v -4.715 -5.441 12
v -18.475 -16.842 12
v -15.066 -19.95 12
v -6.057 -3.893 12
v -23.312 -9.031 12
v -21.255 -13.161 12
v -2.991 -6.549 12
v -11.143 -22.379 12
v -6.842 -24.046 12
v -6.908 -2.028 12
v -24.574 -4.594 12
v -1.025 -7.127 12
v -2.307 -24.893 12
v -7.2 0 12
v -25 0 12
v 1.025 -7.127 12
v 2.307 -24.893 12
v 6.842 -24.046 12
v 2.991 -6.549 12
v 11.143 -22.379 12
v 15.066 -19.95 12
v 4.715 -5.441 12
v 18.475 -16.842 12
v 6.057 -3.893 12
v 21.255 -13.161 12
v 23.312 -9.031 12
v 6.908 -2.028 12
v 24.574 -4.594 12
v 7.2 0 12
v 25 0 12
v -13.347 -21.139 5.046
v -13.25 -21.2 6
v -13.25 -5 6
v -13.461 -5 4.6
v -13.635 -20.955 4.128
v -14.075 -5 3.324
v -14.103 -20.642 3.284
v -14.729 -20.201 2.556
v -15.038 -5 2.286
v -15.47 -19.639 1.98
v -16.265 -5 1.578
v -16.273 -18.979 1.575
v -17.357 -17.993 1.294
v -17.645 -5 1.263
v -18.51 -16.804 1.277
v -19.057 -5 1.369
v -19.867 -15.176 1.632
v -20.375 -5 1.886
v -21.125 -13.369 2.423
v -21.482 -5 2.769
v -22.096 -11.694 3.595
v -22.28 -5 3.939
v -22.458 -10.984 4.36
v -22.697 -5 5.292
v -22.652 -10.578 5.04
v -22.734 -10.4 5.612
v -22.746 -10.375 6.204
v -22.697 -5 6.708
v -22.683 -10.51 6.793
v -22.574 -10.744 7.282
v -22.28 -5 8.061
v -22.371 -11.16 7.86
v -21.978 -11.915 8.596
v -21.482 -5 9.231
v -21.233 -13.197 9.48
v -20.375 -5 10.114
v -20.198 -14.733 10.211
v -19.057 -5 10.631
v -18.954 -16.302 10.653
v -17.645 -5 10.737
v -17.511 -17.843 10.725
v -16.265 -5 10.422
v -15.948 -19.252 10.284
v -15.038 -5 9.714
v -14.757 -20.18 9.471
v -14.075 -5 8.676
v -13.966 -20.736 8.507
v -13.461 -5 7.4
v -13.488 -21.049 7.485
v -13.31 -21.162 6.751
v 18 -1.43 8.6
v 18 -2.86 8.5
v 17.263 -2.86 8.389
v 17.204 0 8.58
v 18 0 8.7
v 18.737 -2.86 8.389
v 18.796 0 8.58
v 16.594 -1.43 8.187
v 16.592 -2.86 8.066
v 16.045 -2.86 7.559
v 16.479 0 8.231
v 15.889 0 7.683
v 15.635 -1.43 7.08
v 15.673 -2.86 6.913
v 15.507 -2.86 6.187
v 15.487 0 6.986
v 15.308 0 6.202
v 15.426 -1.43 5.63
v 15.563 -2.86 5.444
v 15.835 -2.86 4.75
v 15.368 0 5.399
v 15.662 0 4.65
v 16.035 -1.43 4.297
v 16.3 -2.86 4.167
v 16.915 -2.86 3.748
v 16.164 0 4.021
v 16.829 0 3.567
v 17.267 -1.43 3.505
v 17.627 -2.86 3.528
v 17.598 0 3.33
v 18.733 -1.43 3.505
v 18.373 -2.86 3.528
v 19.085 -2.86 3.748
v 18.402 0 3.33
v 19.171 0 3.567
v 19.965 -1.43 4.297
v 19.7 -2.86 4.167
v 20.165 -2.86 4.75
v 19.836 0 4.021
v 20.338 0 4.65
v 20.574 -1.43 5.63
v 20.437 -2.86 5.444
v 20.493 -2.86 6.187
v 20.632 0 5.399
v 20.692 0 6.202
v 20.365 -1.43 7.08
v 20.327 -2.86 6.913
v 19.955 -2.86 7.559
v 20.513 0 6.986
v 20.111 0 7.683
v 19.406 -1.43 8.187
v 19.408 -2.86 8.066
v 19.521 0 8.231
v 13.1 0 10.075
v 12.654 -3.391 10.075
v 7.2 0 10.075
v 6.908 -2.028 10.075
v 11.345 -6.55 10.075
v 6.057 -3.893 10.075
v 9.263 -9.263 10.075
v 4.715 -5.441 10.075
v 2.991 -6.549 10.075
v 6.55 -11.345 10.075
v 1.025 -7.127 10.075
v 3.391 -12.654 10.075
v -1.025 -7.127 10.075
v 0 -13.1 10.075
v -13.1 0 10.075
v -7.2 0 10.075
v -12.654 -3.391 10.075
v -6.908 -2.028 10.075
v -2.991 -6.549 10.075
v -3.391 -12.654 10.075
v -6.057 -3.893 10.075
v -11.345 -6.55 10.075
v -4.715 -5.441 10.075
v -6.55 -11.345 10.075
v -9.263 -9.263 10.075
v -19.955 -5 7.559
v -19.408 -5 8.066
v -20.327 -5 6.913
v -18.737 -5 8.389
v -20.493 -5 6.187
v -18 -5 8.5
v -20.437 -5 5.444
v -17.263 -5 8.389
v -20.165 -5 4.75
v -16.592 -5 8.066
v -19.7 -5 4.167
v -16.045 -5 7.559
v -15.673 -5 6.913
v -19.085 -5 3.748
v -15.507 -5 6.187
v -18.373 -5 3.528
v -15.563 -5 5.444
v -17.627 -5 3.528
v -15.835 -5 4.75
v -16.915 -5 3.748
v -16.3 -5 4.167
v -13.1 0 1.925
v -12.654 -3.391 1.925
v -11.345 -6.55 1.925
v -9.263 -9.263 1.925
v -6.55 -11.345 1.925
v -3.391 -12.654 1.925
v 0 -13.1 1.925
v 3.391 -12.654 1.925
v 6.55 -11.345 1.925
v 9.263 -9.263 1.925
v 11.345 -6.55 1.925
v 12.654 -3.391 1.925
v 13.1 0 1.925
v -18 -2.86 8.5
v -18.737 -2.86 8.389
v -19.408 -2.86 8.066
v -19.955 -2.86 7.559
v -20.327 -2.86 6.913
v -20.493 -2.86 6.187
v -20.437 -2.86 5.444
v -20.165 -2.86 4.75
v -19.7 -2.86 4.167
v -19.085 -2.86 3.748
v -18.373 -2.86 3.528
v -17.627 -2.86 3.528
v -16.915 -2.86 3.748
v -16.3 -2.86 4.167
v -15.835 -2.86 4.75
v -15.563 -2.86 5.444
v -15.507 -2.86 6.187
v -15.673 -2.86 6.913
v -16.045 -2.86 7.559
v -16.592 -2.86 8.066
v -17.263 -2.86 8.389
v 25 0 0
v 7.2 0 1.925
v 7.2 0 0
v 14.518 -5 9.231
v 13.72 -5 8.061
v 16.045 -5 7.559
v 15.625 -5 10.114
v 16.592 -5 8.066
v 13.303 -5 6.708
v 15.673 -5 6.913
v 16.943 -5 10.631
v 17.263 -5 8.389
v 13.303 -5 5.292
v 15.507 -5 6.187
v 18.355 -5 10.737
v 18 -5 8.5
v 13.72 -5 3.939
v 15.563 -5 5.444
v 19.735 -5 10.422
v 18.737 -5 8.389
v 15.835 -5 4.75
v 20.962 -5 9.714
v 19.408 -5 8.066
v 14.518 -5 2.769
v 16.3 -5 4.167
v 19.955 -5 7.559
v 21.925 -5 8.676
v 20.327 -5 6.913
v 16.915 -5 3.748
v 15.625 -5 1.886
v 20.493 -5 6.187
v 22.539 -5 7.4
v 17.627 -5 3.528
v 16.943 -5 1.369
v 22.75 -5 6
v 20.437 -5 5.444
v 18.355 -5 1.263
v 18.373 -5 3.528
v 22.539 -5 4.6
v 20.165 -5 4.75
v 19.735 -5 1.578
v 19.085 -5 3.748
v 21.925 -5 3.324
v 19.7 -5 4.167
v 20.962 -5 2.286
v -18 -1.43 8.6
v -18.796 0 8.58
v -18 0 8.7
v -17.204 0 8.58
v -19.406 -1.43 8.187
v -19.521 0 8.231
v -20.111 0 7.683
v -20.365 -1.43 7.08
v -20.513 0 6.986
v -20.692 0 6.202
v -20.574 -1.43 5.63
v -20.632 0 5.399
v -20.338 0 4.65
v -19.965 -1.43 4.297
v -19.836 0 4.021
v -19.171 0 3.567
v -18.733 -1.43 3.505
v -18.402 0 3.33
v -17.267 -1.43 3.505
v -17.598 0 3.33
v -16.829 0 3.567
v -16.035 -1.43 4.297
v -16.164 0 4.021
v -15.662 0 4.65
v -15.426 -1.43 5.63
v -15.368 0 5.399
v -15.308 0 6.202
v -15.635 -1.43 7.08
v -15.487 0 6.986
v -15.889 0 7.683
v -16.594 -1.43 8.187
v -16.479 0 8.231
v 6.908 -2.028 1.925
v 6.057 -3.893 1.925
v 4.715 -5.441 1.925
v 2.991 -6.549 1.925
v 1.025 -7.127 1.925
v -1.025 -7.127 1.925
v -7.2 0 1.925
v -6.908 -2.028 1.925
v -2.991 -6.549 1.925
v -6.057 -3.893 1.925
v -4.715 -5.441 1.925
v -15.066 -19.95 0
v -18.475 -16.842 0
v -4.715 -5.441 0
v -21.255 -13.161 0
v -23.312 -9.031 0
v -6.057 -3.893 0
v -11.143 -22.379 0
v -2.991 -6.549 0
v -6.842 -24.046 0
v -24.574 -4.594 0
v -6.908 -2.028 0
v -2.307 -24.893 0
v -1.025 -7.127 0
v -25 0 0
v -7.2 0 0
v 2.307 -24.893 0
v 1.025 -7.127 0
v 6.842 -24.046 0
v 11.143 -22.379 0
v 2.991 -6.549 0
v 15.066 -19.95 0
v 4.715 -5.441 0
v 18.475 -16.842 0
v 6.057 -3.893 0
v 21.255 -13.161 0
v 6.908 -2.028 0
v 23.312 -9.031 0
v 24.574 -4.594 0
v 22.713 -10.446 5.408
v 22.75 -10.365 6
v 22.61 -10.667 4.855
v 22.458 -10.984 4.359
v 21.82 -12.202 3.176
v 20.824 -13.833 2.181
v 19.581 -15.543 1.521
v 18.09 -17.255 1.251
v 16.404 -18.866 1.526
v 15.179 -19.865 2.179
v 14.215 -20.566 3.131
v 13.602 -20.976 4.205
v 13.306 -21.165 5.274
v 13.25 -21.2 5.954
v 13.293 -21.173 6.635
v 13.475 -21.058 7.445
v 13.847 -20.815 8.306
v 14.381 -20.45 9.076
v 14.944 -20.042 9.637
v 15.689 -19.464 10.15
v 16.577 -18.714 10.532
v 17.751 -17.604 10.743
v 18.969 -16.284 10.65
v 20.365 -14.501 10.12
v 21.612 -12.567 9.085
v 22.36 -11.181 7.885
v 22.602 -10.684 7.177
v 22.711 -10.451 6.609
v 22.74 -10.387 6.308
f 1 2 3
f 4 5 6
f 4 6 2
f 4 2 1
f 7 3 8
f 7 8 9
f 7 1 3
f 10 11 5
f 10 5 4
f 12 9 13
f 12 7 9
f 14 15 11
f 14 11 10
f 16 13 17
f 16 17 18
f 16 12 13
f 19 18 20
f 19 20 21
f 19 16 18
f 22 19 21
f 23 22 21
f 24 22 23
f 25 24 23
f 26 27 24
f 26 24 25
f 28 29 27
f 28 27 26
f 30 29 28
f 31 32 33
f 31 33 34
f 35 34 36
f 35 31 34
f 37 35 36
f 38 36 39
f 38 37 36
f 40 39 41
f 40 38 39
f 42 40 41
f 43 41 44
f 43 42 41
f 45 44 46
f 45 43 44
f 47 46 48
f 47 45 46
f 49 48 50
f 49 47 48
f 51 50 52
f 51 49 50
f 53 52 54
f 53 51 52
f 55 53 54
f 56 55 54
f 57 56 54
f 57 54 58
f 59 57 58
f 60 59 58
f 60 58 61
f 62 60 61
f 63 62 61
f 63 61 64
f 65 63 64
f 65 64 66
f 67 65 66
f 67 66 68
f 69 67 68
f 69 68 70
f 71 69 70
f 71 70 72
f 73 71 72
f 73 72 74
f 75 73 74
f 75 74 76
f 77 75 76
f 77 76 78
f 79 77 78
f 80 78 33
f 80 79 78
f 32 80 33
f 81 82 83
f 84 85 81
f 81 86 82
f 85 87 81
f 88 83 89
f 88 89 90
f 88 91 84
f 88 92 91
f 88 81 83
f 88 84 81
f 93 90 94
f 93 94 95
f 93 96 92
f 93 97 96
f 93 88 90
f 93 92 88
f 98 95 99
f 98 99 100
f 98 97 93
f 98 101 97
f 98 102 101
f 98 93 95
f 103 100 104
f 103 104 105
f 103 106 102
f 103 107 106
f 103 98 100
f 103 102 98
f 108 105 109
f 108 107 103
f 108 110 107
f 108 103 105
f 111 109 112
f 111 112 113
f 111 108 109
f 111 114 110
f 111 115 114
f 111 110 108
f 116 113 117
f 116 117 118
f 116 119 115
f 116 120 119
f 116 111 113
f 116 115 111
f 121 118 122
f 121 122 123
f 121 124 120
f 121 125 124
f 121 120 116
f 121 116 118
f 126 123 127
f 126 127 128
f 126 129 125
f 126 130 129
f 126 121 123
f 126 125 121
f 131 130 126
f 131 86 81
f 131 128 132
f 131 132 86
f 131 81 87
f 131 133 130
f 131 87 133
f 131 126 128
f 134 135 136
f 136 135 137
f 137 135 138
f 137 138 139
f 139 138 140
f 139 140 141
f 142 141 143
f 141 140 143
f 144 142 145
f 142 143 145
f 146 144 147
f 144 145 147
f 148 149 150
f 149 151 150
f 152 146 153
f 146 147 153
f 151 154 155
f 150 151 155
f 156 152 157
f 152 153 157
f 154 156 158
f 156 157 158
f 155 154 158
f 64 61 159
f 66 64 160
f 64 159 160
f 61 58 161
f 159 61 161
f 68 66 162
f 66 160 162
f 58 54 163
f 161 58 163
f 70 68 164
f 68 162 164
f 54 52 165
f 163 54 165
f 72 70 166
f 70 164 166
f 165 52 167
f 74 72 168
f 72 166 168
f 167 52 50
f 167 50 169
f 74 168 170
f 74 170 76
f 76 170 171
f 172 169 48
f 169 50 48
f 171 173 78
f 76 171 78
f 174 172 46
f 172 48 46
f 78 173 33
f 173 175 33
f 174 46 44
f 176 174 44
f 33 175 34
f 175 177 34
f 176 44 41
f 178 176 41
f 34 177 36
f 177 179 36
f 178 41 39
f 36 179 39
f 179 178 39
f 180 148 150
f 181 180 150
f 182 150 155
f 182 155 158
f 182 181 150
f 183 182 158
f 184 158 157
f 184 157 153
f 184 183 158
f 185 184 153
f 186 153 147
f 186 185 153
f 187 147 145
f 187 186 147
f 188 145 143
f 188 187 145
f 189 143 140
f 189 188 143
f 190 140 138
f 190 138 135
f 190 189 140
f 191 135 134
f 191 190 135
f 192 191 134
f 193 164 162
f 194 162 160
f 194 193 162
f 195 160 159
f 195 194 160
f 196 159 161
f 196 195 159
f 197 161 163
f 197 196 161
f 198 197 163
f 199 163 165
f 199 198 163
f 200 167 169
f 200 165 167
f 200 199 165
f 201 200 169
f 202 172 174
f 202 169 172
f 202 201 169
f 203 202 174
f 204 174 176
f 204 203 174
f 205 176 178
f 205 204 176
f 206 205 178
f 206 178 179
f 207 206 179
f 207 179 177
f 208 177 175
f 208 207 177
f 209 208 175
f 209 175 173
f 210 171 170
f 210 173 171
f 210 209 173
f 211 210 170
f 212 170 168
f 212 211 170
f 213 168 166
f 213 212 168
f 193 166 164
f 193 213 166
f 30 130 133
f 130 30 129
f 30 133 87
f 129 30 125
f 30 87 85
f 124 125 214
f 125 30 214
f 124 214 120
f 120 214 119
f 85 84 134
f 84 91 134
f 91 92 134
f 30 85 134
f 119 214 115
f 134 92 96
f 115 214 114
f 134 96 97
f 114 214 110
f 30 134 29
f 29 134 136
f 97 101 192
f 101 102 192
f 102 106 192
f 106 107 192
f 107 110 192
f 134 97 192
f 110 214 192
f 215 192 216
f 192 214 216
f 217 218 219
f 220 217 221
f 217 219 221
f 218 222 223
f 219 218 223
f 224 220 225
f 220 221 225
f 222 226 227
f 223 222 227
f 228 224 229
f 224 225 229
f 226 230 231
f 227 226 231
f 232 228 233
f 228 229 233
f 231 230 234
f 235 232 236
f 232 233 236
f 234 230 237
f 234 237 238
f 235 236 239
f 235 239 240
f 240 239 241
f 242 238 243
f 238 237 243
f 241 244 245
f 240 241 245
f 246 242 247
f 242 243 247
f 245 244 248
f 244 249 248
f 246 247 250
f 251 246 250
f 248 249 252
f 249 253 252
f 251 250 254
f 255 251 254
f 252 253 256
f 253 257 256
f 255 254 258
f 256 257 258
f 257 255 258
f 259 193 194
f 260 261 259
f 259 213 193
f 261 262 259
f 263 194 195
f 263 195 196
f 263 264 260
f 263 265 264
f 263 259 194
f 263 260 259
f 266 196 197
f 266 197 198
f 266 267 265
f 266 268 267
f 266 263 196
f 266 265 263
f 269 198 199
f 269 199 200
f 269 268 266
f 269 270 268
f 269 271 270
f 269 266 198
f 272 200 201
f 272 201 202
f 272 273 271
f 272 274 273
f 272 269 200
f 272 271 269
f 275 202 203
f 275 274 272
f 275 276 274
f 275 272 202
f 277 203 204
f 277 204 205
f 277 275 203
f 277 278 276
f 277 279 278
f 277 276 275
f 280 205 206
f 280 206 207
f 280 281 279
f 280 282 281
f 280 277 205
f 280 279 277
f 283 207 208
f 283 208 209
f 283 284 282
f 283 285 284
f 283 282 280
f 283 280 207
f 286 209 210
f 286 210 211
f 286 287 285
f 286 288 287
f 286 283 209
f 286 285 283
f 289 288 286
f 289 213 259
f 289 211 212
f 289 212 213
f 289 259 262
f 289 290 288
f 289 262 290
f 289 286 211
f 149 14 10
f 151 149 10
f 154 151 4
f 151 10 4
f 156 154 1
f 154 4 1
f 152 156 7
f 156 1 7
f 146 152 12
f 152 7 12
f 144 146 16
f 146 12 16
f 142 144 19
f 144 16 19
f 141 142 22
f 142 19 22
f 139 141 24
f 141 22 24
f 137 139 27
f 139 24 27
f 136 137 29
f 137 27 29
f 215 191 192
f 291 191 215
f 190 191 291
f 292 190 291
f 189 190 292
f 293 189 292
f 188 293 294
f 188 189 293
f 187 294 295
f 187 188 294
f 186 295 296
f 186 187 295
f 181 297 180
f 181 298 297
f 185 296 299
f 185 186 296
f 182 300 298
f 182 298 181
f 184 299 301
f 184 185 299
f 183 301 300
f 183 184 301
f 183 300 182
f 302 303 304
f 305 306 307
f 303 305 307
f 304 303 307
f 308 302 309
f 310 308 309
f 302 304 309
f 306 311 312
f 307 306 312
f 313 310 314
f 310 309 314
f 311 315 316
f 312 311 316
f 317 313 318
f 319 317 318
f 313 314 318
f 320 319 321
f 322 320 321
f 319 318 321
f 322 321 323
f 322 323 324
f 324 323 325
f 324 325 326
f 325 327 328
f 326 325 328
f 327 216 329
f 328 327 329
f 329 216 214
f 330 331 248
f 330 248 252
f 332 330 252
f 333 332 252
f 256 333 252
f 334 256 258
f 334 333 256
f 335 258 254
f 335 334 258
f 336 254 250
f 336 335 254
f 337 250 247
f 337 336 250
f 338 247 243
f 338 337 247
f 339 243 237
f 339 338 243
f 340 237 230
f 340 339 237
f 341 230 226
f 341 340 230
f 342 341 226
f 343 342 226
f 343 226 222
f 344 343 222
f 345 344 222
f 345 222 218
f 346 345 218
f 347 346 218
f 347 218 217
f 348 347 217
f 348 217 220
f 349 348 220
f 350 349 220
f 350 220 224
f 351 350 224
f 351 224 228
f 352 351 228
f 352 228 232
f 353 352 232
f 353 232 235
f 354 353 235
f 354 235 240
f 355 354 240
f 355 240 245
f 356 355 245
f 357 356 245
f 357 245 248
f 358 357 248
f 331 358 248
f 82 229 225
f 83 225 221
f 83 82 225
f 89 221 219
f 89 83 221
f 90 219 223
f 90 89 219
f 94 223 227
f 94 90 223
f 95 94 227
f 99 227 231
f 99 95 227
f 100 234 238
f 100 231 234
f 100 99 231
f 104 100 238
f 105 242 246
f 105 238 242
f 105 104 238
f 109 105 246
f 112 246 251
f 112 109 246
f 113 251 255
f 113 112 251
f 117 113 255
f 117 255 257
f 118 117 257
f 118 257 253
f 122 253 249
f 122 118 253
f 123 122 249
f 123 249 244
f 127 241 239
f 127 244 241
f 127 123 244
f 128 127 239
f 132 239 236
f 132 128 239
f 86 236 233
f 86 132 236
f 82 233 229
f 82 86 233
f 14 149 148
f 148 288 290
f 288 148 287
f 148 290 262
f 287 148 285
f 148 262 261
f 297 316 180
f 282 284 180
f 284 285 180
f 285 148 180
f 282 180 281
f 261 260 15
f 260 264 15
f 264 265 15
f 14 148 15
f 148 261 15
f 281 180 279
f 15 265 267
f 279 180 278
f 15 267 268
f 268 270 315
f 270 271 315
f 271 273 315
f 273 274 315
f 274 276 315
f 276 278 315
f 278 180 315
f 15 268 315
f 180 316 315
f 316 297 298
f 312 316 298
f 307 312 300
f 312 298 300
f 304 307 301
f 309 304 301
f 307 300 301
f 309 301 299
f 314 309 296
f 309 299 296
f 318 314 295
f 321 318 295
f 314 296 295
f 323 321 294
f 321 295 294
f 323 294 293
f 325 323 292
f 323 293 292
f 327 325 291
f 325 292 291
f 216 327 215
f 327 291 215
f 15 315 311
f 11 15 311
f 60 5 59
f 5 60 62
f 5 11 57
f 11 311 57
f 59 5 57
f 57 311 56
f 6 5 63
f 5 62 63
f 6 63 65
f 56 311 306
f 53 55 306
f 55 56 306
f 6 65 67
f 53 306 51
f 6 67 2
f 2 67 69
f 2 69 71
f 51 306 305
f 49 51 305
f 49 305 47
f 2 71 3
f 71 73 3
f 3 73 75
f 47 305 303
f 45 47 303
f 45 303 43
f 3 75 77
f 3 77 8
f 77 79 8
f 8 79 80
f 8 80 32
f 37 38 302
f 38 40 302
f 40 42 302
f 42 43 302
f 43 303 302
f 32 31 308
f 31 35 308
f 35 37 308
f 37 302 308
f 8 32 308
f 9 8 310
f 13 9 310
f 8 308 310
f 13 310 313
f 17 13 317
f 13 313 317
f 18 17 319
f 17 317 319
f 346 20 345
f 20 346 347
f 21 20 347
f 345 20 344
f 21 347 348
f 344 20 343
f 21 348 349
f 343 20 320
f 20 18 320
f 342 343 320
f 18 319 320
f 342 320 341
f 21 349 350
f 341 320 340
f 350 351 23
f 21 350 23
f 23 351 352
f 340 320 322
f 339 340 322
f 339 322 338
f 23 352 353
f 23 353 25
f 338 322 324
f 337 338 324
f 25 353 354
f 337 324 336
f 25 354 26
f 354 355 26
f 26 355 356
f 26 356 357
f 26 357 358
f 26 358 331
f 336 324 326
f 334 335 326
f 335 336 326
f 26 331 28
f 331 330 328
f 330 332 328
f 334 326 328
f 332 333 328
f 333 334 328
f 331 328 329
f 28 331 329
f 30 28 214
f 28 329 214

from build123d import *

# Parameters (mm, degrees)
BOSS_EXTRUDE1_DEPTH                          = 12
SKETCH2_R                                    = 4.75
CUT_EXTRUDE1_DEPTH                           = 35
SKETCH3_R                                    = 2.05
CUT_EXTRUDE2_DEPTH                           = 35
SKETCH4_W                                    = 5.9
SKETCH4_H                                    = 8.15
CSK_FOR_M3_CROSS_COUNTERSUNK_HEAD_SC_2_COUNT = 2
CSK_FOR_M3_CROSS_COUNTERSUNK_HEAD_SC_2_PITCH = 36


with BuildPart() as part:
    # Sketch1 → Boss-Extrude1 (new body)
    with BuildSketch(Plane.XY):
        with BuildLine():
            Line((-9.1, 0), (-25, 0))
            ThreePointArc((-25, 0), (0, -25), (25, 0))
            Line((25, 0), (9.211282306, 0))
            Line((9.211282306, 0), (9.1, 0))
            Line((9.1, 0), (-9.1, 0))
        make_face()
    extrude(amount=BOSS_EXTRUDE1_DEPTH)

    # Sketch2 → Cut-Extrude1 (cut)
    with BuildSketch(Plane(origin=(0, -40, 0), x_dir=(1, 0, 0), z_dir=(0, 1, 0))):
        with Locations((18, -6)):
            Circle(SKETCH2_R)
        with Locations((-18, -6)):
            Circle(SKETCH2_R)
    extrude(amount=CUT_EXTRUDE1_DEPTH, mode=Mode.SUBTRACT)

    # Sketch3 → Cut-Extrude2 (cut)
    with BuildSketch(Plane.XZ.offset(5)):
        with Locations((18, 6)):
            Circle(SKETCH3_R)
        with Locations((-18, 6)):
            Circle(SKETCH3_R)
    extrude(amount=-CUT_EXTRUDE2_DEPTH, mode=Mode.SUBTRACT)

    # Sketch4 → Cut-Revolve1 (revolve, cut)
    with BuildSketch(Plane(origin=(0, 0, 0), x_dir=(1, 0, 0), z_dir=(0, 1, 0))):
        Polygon((0, -12), (0, 0), (-7.2, 0), (-7.2, -1.925), (-7.2, -10.075), (-7.2, -12), align=None)
        with Locations((-10.15, -6)):
            Rectangle(SKETCH4_W, SKETCH4_H)
    revolve(axis=Axis((0, 0, 0), (0, 0, 1)), mode=Mode.SUBTRACT)

    # Sketch6 → CSK for M3 Cross Countersunk Head Screw1 (revolve, cut)
    with BuildSketch(Plane(origin=(18, 0, 6), x_dir=(0, 0, 1), z_dir=(1, 0, 0))):
        Polygon((0, 0), (0, 25), (2.5, 25), (2.5, 2.860133251), (2.7, 0), align=None)
    csk_for_m3_cross_countersunk_head_screw1 = revolve(axis=Axis((18, 6.35, 6), (0, -1, 0)), mode=Mode.SUBTRACT)

    # CSK for M3 Cross Countersunk Head Sc 2: CSK for M3 Cross Countersunk Head Screw1 ×2
    with Locations(*[(-i * CSK_FOR_M3_CROSS_COUNTERSUNK_HEAD_SC_2_PITCH, 0, 0) for i in range(1, CSK_FOR_M3_CROSS_COUNTERSUNK_HEAD_SC_2_COUNT)]):
        add(csk_for_m3_cross_countersunk_head_screw1, mode=Mode.SUBTRACT)


solid = part.part
